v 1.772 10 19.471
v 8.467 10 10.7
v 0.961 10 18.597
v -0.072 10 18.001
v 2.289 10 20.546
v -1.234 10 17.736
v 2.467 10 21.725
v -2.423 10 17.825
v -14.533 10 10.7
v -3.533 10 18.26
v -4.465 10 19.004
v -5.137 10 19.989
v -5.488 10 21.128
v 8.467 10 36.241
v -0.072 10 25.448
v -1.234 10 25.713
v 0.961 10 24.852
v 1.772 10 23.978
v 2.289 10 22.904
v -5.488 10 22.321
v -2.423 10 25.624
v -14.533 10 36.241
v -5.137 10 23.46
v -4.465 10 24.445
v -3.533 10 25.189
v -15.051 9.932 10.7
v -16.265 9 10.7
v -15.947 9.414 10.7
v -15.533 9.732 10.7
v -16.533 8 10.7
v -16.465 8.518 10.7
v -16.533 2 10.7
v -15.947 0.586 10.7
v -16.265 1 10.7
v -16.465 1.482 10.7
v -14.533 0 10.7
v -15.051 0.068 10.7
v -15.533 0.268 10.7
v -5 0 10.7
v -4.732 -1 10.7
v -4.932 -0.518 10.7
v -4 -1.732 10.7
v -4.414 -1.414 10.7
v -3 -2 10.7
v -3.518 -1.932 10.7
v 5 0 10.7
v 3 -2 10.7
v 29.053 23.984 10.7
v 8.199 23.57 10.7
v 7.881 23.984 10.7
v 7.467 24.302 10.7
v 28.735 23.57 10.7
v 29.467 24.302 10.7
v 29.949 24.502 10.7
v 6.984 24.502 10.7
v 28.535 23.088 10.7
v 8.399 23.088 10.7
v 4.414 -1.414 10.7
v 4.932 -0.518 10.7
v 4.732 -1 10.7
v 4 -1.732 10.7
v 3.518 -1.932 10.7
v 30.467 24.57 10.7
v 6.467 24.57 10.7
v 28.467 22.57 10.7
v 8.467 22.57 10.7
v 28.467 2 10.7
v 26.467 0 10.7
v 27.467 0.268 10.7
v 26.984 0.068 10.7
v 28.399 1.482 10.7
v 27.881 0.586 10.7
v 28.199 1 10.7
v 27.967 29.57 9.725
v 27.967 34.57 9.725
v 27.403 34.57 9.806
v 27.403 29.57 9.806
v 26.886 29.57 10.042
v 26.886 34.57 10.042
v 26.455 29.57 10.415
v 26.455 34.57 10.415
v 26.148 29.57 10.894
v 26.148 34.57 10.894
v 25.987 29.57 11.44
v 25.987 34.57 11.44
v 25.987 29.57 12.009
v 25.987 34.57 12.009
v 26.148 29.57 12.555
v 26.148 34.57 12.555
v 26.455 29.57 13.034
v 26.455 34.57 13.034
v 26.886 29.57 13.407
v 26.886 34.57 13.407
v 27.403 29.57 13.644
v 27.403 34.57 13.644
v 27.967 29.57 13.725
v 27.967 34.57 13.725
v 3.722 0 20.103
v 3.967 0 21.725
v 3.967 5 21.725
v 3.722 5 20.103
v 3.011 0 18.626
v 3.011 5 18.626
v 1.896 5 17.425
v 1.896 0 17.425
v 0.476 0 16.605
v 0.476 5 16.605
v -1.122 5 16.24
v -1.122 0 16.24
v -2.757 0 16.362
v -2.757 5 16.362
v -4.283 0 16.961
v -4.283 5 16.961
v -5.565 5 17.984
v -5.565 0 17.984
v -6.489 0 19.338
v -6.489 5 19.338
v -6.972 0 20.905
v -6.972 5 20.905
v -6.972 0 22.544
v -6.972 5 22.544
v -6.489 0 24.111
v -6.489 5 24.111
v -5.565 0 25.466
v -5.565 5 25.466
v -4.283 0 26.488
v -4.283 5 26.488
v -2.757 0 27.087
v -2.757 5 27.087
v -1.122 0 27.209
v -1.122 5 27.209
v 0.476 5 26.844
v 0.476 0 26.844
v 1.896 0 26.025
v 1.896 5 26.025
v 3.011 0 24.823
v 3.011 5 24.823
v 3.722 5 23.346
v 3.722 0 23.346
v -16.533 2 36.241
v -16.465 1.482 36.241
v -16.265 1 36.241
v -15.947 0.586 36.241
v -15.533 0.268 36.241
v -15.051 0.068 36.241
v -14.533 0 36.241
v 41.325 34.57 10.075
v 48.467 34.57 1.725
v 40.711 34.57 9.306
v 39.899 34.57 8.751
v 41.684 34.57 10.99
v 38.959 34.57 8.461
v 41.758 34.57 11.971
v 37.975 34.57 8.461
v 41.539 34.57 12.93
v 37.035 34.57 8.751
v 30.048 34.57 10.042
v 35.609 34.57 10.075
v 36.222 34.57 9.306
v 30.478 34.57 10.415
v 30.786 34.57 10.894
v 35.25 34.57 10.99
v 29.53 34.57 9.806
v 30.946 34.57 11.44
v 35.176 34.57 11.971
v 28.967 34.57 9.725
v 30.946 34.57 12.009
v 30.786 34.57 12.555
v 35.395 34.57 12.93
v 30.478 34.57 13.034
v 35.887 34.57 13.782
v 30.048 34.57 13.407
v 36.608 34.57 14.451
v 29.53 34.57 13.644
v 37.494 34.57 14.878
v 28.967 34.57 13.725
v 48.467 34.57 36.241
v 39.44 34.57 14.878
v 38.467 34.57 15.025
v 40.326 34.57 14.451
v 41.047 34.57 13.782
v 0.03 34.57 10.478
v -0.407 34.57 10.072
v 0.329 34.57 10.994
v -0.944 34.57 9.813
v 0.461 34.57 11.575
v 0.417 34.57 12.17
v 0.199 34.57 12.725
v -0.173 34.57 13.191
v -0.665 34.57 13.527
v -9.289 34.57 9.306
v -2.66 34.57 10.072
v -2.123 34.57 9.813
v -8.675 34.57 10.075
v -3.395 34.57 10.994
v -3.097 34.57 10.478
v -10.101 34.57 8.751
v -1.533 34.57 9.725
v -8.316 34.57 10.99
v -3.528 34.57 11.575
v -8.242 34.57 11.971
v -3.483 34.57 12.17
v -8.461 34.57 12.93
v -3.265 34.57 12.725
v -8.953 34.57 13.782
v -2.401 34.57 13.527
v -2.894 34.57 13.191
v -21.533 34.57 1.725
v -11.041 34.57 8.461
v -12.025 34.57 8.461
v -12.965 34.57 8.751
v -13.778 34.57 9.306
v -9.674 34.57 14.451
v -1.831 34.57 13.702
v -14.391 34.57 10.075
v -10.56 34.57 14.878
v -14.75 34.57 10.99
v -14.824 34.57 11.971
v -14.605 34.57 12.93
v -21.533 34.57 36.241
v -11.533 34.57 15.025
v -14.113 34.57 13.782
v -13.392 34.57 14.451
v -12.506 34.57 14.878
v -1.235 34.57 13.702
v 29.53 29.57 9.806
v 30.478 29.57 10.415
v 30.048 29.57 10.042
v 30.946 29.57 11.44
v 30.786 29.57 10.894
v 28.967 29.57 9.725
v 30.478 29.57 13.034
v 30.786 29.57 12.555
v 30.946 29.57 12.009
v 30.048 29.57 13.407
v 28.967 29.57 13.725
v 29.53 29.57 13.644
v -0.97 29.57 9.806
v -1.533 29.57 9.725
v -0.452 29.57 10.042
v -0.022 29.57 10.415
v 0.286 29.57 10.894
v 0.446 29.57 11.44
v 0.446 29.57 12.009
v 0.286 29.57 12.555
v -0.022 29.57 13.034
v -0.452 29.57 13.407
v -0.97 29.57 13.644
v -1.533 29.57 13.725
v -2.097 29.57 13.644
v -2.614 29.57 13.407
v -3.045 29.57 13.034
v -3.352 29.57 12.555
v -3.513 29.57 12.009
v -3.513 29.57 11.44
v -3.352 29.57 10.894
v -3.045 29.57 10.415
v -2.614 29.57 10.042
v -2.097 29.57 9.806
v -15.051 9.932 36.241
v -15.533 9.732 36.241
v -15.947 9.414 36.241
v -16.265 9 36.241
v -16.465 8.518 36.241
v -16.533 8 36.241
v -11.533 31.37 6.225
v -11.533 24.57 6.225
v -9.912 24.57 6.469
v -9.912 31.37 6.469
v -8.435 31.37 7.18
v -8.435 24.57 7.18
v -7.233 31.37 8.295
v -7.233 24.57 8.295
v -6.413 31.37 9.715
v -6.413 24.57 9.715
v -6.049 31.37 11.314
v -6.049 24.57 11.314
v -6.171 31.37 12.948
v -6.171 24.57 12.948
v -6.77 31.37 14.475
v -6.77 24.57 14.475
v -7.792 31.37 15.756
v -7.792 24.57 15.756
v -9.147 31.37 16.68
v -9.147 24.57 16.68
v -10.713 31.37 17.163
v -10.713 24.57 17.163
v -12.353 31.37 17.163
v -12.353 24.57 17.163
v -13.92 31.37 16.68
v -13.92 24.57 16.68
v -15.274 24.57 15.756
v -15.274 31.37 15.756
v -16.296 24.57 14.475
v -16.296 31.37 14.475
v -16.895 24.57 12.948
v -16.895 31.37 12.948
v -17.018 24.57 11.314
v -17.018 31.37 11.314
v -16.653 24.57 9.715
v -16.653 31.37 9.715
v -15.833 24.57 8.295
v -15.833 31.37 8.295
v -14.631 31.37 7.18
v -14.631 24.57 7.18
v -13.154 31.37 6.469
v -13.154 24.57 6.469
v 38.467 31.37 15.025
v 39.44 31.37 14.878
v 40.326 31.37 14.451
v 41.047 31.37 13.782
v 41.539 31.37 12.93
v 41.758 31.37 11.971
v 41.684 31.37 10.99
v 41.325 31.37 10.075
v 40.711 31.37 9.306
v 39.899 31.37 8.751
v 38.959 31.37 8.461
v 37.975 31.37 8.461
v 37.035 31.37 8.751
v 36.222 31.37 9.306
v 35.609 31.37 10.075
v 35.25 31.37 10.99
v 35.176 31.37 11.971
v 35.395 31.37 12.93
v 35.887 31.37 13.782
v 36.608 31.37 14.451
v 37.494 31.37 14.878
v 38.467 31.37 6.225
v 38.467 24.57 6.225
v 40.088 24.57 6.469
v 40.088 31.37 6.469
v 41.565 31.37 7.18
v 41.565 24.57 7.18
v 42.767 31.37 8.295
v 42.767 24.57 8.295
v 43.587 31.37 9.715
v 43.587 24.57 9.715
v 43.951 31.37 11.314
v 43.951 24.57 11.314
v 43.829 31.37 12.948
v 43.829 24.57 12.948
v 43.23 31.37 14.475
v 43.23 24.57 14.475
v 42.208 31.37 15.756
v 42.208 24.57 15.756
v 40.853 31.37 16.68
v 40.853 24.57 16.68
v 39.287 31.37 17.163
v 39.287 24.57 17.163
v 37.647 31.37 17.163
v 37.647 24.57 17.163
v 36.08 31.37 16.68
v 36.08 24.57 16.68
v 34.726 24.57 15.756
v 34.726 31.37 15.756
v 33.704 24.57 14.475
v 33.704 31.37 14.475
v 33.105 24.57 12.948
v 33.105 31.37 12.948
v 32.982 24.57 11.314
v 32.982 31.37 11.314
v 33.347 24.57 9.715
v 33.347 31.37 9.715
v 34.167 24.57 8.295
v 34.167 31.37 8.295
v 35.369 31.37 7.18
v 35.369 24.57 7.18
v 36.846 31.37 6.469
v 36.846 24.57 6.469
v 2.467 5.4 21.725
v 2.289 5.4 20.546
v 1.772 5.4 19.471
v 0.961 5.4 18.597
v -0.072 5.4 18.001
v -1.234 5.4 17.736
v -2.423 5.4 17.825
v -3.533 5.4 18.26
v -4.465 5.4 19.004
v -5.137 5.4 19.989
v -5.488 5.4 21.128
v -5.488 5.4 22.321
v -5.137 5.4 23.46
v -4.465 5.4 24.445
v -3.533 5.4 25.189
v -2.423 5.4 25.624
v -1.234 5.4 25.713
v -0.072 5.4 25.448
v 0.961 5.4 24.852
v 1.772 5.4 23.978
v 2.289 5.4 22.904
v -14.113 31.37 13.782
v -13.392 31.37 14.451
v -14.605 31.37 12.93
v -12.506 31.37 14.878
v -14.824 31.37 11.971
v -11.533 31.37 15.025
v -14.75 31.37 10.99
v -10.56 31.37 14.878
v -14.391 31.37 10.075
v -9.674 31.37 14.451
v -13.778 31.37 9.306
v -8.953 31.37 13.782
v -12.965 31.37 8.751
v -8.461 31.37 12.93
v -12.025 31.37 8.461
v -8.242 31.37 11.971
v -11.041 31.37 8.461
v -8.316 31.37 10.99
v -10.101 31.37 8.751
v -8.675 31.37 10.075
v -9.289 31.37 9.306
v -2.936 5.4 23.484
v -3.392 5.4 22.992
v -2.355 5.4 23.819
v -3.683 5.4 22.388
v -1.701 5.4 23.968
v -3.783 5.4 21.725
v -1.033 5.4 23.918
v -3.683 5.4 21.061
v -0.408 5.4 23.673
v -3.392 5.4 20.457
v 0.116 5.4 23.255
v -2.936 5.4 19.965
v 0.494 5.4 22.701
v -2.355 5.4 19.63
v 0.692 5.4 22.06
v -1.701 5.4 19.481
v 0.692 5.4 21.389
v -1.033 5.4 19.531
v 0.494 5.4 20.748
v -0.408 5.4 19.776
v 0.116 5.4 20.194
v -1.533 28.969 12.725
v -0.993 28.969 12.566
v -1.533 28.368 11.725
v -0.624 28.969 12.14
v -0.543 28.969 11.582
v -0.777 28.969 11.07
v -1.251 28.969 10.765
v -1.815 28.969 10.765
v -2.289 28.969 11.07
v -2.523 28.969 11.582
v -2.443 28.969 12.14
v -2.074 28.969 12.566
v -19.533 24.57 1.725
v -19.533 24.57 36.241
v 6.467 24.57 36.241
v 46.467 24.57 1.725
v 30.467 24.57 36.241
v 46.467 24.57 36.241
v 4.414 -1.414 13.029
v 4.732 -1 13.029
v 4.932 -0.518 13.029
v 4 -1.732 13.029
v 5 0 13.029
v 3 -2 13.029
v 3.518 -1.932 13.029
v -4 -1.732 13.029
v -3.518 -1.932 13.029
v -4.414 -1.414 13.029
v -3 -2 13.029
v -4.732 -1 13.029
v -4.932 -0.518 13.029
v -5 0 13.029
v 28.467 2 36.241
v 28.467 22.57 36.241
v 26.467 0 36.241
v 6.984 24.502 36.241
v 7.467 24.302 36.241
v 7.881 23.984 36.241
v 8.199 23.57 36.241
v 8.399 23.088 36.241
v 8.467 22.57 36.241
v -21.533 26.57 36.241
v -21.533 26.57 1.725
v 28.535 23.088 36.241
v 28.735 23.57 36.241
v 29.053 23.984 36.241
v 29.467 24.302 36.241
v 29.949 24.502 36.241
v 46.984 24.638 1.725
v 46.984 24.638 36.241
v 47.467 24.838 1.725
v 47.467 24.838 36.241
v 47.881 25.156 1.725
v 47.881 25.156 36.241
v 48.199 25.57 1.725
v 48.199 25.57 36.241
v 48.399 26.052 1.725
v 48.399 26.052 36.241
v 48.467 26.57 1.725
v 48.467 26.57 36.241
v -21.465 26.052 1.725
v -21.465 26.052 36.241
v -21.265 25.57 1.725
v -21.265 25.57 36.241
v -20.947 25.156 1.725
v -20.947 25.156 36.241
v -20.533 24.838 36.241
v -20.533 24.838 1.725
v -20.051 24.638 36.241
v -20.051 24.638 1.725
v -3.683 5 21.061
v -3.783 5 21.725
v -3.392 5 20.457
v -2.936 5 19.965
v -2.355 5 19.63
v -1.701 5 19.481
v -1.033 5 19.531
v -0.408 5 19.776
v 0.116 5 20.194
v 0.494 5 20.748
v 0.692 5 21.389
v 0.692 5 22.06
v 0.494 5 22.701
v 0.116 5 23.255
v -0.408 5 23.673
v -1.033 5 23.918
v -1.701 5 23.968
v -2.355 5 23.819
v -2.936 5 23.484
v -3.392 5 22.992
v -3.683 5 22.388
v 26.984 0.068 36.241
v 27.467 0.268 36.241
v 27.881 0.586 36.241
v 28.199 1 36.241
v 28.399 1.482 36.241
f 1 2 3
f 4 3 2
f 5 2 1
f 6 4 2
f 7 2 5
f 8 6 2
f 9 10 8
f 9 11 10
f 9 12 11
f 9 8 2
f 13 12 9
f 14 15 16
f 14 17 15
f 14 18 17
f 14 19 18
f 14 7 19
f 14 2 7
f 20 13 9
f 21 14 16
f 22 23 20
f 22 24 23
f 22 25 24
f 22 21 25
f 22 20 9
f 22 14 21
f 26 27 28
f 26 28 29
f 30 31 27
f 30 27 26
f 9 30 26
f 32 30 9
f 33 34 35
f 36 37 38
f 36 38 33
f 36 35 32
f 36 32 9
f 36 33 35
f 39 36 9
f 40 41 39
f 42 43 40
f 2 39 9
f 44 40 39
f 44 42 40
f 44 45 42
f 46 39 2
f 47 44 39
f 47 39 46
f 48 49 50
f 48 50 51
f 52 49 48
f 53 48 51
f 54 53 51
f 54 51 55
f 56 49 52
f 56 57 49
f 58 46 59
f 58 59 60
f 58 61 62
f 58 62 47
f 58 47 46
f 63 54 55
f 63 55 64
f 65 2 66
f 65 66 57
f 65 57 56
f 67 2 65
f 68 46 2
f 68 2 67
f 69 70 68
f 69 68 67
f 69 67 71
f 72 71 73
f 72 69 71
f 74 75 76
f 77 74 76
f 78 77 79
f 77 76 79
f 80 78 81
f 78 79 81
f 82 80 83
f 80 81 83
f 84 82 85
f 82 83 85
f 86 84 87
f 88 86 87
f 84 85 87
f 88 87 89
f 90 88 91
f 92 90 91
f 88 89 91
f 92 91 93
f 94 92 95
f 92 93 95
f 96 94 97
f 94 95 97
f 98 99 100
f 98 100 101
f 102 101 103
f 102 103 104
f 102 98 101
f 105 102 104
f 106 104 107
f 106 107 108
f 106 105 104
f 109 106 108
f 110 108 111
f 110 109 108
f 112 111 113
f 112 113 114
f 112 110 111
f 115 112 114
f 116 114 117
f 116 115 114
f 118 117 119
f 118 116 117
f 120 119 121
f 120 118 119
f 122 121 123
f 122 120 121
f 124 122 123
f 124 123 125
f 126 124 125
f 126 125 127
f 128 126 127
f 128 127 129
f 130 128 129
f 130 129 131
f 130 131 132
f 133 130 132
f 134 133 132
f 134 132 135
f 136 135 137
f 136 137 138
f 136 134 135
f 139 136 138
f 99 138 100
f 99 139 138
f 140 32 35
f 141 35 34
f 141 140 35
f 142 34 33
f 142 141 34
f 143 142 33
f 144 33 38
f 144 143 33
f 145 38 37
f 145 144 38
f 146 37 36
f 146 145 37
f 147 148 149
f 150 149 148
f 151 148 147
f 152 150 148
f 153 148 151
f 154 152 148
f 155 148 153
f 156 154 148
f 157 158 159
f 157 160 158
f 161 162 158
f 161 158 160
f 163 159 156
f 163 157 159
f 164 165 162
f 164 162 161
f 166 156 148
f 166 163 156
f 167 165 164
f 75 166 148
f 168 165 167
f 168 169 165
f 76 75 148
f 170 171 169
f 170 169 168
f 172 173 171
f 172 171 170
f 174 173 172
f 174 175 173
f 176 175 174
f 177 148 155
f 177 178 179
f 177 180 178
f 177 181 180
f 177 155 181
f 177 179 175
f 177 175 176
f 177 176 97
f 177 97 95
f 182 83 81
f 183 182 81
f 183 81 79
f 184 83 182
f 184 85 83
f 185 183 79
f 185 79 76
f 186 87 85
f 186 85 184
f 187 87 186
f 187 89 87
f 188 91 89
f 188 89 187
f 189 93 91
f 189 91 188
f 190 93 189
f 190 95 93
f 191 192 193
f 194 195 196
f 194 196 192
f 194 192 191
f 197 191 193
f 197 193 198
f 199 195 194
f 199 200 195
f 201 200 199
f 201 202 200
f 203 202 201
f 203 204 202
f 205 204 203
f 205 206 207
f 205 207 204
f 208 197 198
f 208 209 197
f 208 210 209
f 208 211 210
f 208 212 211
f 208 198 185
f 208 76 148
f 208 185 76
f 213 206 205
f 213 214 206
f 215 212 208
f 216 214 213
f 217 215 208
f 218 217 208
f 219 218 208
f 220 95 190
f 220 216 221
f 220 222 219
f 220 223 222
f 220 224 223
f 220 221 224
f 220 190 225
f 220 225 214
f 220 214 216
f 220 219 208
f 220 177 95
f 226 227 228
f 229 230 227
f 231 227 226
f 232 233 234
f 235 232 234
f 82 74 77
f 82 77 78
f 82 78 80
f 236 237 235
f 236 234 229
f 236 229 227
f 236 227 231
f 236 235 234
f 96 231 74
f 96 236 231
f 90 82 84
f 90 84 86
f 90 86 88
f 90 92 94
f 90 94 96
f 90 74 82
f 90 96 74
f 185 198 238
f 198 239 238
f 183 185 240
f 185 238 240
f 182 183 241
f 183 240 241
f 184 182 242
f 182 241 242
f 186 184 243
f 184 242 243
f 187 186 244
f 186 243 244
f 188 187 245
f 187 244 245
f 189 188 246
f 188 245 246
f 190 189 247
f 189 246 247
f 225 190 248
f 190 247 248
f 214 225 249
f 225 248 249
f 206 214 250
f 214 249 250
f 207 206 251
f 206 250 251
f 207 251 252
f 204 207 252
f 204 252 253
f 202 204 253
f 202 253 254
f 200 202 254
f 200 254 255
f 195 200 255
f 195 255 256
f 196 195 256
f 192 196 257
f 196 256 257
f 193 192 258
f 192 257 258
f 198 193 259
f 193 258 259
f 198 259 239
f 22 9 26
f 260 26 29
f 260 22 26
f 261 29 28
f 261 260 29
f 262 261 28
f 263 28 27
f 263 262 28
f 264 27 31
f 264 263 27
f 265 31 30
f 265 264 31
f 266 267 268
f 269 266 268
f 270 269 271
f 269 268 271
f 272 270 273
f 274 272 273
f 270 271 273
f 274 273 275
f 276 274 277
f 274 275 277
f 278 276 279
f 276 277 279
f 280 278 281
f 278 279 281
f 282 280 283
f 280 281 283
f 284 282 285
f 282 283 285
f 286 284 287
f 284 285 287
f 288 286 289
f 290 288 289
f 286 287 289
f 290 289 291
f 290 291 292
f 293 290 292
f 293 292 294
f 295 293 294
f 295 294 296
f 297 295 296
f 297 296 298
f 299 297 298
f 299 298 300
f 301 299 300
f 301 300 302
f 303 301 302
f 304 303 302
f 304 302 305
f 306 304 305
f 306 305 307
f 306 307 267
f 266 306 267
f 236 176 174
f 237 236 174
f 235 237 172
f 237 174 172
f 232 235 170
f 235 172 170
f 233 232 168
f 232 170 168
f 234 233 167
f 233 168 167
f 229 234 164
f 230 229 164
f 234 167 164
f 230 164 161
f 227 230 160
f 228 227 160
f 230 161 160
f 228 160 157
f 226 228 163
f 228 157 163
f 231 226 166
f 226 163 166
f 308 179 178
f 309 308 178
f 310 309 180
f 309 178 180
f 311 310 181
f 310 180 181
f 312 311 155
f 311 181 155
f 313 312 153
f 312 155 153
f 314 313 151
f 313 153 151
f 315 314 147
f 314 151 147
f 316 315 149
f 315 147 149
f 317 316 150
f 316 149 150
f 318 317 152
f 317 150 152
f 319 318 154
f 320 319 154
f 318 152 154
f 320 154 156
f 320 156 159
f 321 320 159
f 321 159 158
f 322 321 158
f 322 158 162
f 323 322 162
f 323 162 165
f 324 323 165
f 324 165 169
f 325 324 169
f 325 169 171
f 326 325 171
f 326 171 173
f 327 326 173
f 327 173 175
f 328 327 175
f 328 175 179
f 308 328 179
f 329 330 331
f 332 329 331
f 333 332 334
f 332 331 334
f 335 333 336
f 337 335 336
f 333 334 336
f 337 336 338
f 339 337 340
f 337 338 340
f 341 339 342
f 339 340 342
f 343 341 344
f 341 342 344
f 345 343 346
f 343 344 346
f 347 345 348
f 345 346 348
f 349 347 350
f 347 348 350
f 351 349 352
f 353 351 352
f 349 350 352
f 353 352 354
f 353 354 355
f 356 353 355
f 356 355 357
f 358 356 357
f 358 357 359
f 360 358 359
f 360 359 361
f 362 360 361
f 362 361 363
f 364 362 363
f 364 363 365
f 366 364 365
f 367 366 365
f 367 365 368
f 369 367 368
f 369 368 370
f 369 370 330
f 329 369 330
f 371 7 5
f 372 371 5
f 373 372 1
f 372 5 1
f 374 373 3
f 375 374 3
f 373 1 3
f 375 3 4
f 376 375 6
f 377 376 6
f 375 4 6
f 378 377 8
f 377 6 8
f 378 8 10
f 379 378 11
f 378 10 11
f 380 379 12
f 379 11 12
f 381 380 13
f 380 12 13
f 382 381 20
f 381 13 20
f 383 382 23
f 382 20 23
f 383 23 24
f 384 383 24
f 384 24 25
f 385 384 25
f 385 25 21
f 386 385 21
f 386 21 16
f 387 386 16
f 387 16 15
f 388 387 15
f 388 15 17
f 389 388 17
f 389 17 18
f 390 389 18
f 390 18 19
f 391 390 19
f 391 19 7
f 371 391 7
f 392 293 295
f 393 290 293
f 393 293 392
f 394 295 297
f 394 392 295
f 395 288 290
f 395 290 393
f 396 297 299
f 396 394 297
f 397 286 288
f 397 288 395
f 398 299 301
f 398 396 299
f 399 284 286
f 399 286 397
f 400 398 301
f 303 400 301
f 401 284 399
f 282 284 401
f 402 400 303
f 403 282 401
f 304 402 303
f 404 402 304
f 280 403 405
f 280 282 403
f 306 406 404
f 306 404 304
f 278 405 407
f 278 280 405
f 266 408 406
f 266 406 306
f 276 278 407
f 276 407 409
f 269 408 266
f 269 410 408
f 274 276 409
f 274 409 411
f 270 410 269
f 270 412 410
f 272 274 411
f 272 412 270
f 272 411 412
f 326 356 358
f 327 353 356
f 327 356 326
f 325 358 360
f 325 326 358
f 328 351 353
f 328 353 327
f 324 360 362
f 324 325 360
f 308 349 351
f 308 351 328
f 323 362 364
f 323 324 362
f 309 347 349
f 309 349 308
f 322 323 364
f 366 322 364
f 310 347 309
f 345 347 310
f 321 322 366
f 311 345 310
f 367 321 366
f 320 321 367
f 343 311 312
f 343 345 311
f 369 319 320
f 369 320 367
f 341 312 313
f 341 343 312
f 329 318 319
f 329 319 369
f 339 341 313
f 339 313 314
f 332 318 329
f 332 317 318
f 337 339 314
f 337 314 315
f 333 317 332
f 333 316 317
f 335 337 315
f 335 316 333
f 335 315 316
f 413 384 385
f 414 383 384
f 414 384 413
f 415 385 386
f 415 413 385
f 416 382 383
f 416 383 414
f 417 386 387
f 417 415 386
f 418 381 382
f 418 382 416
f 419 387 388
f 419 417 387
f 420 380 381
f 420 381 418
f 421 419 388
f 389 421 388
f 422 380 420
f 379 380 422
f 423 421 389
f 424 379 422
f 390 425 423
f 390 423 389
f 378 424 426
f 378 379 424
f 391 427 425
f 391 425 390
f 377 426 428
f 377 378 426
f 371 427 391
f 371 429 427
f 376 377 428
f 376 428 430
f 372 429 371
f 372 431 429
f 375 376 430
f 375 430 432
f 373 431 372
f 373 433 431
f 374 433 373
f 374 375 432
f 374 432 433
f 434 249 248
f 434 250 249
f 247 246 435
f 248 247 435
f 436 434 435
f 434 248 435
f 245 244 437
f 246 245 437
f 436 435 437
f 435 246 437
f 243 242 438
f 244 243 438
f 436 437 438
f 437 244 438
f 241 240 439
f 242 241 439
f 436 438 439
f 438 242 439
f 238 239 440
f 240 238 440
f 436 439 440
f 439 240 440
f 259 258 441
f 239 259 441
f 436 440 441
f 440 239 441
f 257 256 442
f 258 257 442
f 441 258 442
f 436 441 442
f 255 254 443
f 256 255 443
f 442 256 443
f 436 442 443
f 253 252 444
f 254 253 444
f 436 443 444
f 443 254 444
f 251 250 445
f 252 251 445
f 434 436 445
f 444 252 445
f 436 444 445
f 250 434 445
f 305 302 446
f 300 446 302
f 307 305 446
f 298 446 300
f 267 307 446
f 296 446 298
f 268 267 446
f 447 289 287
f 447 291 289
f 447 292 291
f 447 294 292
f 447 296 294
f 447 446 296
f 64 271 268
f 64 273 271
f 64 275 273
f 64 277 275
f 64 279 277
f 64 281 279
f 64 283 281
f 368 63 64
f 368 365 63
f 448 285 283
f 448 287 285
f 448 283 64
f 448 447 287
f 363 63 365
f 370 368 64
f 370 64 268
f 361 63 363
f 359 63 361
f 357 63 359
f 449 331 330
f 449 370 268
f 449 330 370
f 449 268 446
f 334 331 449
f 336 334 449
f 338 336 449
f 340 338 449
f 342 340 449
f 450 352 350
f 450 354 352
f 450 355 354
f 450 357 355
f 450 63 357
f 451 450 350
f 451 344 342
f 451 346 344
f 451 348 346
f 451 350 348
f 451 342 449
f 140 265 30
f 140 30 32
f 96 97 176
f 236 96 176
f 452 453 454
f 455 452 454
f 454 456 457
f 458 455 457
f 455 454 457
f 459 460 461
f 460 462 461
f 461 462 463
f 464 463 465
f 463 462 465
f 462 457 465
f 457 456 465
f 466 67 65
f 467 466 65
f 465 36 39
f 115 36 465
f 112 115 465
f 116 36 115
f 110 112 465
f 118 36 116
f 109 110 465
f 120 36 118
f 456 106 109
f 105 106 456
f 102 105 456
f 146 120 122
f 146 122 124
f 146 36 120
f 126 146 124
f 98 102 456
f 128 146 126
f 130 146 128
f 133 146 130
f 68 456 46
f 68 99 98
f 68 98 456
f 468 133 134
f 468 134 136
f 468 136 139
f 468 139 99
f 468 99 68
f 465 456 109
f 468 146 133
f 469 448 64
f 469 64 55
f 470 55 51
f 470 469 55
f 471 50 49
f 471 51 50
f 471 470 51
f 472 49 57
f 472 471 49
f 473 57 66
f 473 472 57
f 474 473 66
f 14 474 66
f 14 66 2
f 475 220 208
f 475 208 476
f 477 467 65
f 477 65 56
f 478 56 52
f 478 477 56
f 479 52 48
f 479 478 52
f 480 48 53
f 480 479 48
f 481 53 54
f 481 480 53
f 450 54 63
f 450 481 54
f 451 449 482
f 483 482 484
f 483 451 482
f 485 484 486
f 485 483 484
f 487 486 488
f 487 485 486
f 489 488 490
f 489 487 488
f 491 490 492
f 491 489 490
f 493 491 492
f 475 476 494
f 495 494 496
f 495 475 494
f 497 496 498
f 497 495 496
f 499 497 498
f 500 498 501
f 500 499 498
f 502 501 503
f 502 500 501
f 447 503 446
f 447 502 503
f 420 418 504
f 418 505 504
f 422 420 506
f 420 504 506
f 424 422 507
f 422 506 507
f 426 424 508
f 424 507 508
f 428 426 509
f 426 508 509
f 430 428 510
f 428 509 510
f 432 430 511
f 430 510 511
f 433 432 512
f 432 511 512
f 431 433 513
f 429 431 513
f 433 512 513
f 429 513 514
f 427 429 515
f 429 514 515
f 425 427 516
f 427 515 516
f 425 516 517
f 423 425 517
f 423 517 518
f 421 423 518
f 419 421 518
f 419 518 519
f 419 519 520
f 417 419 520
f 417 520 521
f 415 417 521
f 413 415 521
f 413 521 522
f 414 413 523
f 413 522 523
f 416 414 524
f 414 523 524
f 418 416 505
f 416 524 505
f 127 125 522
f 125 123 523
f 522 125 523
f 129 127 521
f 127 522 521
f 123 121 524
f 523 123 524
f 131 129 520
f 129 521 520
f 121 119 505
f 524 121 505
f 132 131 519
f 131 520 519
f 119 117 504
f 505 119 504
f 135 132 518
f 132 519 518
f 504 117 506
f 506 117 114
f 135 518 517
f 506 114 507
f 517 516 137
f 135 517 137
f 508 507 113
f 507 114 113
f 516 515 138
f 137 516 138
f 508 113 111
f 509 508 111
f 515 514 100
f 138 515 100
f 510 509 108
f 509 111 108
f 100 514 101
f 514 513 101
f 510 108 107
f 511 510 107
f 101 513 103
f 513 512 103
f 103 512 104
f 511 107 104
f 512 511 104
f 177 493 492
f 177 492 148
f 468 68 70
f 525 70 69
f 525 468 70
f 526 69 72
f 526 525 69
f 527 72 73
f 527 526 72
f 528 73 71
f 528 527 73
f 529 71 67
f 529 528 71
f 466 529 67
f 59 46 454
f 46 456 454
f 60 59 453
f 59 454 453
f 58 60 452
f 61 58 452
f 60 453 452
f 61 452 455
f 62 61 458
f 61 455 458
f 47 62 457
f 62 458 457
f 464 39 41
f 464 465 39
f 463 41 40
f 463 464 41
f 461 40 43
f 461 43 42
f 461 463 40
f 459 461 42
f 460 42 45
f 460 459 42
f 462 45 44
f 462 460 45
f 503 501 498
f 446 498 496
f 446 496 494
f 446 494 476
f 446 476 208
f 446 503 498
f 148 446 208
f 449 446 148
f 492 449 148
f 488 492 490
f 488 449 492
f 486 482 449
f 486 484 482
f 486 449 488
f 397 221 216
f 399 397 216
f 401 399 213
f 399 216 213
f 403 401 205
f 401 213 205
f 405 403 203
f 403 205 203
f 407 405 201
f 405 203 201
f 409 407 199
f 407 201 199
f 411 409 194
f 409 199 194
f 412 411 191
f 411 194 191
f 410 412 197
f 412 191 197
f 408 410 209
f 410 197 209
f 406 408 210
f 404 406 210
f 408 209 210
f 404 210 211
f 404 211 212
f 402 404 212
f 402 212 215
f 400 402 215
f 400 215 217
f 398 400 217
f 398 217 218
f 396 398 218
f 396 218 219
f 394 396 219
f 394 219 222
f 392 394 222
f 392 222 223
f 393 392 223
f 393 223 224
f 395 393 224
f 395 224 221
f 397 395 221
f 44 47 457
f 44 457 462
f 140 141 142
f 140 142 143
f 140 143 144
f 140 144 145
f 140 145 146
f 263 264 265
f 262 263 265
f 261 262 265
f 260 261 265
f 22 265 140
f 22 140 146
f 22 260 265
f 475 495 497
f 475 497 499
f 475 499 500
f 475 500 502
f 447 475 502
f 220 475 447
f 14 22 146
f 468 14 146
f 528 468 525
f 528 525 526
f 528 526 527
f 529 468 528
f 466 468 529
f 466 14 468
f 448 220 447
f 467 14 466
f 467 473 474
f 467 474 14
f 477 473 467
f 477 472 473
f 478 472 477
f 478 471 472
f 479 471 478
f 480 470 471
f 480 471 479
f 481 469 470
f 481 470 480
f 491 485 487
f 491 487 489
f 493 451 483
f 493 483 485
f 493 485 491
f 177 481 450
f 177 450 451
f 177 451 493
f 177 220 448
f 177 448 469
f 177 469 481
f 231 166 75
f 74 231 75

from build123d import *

# Parameters (mm, degrees)
SKETCH_8_W                = 70
SKETCH_8_H                = 30
EXTRUDE_3_DEPTH           = 34.57
SKETCH_9_W                = 30
SKETCH_9_H                = 14.57
SKETCH_9_W_2              = 20
CUT_EXTRUDE_3_DEPTH       = 67.664217758
OTHER_1_OUTLINE_R         = 5.5
OTHER_1_DEPTH             = 5
HOLE_WIZARD_2_D           = 4.5
HOLE_WIZARD_2_DEPTH       = 10
HOLE_WIZARD_2_CBORE_D     = 8
HOLE_WIZARD_2_CBORE_DEPTH = 4.6
BACK_REACH                = 69.458
SKETCH_16_W               = 70
SKETCH_16_H               = 8.975361008
MM_1_D                    = 4
MM_1_DEPTH                = 5
MM_1_TIP                  = 1.201721238
CUT_EXTRUDE_5_DEPTH       = 5
SKETCH_24_W               = 5
SKETCH_24_H               = 21.024638992
SKETCH_24_W_2             = 20
CUT_EXTRUDE_6_DEPTH       = 10
HOLE_WIZARD_3_D           = 6.6
HOLE_WIZARD_3_DEPTH       = 10
HOLE_WIZARD_3_CBORE_D     = 11
HOLE_WIZARD_3_CBORE_DEPTH = 6.8
FILLET_1_R                = 2
SKETCH_29_W               = 10
SKETCH_29_H               = 2
EXTRUDE_5_DEPTH           = 2.329281552
FILLET_3_R                = 2
CUT_EXTRUDE_7_DEPTH       = 0.5
EXTRUDE_START             = 5.016506594
EXTRUDE_6_DEPTH           = 5.016506594


# Read off the part's stored shape, not the designer's step: 孔1
with BuildPart() as part:
    # 草图8 → 凸台-拉伸3 (new body)
    with BuildSketch(Plane(origin=(0, 0, 0), x_dir=(1, 0, 0), z_dir=(0, 1, 0))):
        with Locations((13.466824006, -16.724598186)):
            Rectangle(SKETCH_8_W, SKETCH_8_H)
    extrude(amount=EXTRUDE_3_DEPTH)

    # 草图9 → 切除-拉伸3 (cut, through all)
    with BuildSketch(Plane.XY.offset(31.724598186)):
        with Locations((-6.533175994, 17.285)):
            Rectangle(SKETCH_9_W, SKETCH_9_H)
        with Locations((38.466824006, 17.285)):
            Rectangle(SKETCH_9_W_2, SKETCH_9_H)
    extrude(amount=-CUT_EXTRUDE_3_DEPTH, mode=Mode.SUBTRACT)

    # 孔1 outline → 孔1 (cut)
    with BuildSketch(Plane(origin=(0, 0, 0), x_dir=(1, 0, 0), z_dir=(0, 1, 0))):
        with Locations((-1.533175994, -21.724598186)):
            Circle(OTHER_1_OUTLINE_R)
    extrude(amount=OTHER_1_DEPTH, mode=Mode.SUBTRACT)

    # 打孔尺寸(%根据)内六角圆柱头螺钉的类型2
    with Locations(Plane(origin=(-1.533175994, 10, 21.724598186), x_dir=(1, 0, 0), z_dir=(0, 1, 0))):
        with Locations((0, 0)):
            CounterBoreHole(HOLE_WIZARD_2_D / 2, HOLE_WIZARD_2_CBORE_D / 2, HOLE_WIZARD_2_CBORE_DEPTH, depth=HOLE_WIZARD_2_DEPTH)

    # back: up to this face of the body (flat: up to its plane)
    back_end = Plane(part.part.faces().sort_by_distance((-6.533175994, 24.57, 16.724598186))[0])
    # 草图16 → back (cut, up to the picked face)
    with BuildSketch(Plane(origin=(0, 0, 0), x_dir=(1, 0, 0), z_dir=(0, 1, 0)), mode=Mode.PRIVATE) as back_sk1:
        with Locations((13.466824006, -6.21227869)):
            Rectangle(SKETCH_16_W, SKETCH_16_H)
    back_tool1 = split(extrude(back_sk1.sketch, amount=BACK_REACH, mode=Mode.PRIVATE), bisect_by=back_end, keep=Keep.BOTH, mode=Mode.PRIVATE)
    add(back_tool1.solids().sort_by(Axis((13.466824, 0, 6.212279), (0, 1, 0)))[0], mode=Mode.SUBTRACT)

    # 大小mm 暗销孔1
    with Locations(Plane(origin=(-1.533175994, 34.57, 11.724598186), x_dir=(0, 0, 1), z_dir=(0, 1, 0))):
        with Locations((0, 0)):
            Hole(MM_1_D / 2, depth=MM_1_DEPTH)
            with Locations((0, 0, -(MM_1_DEPTH + MM_1_TIP / 2))):  # 118° drill point
                Cone(0, MM_1_D / 2, MM_1_TIP, mode=Mode.SUBTRACT)

    # 草图23 → 切除-拉伸5 (cut)
    with BuildSketch(Plane.XZ.offset(-34.57)):
        with BuildLine():
            Line((28.966824006, 9.724598186), (27.966824006, 9.724598186))
            ThreePointArc((27.966824006, 9.724598186), (25.966824006, 11.724598186), (27.966824006, 13.724598186))
            Line((27.966824006, 13.724598186), (28.966824006, 13.724598186))
            ThreePointArc((28.966824006, 13.724598186), (30.966824006, 11.724598186), (28.966824006, 9.724598186))
        make_face()
    extrude(amount=CUT_EXTRUDE_5_DEPTH, mode=Mode.SUBTRACT)

    # 草图24 → 切除-拉伸6 (cut)
    with BuildSketch(Plane(origin=(0, 0, 0), x_dir=(1, 0, 0), z_dir=(0, 1, 0))):
        with Locations((-19.033175994, -21.21227869)):
            Rectangle(SKETCH_24_W, SKETCH_24_H)
        with Locations((38.466824006, -21.21227869)):
            Rectangle(SKETCH_24_W_2, SKETCH_24_H)
    extrude(amount=CUT_EXTRUDE_6_DEPTH, mode=Mode.SUBTRACT)

    # 打孔尺寸(%根据)内六角圆柱头螺钉的类型3
    with Locations(Plane(origin=(-11.533175994, 24.57, 11.724598186), x_dir=(0, 0, -1), z_dir=(0, -1, 0))):
        with Locations((0, 0), (0, 50)):
            CounterBoreHole(HOLE_WIZARD_3_D / 2, HOLE_WIZARD_3_CBORE_D / 2, HOLE_WIZARD_3_CBORE_DEPTH, depth=HOLE_WIZARD_3_DEPTH)

    # 圆角1
    fillet_1_edges = [part.edges().sort_by_distance(p)[0] for p in [
        (-16.533175994, 0, 21.21227869),
        (-16.533175994, 10, 21.21227869),
        (28.466824006, 0, 21.21227869),
        (-21.533175994, 24.57, 16.724598186),
        (48.466824006, 24.57, 16.724598186),
        (8.466824006, 24.57, 21.21227869),
        (28.466824006, 24.57, 21.21227869),
    ]]
    fillet(fillet_1_edges, radius=FILLET_1_R)

    # 草图29 → 凸台-拉伸5 (add)
    with BuildSketch(Plane(origin=(0, 0, 10.699959194), x_dir=(-1, 0, 0), z_dir=(0, 0, -1))):
        with Locations((0, -1)):
            Rectangle(SKETCH_29_W, SKETCH_29_H)
    extrude(amount=-EXTRUDE_5_DEPTH)

    # 圆角3
    fillet_3_edges = [part.edges().sort_by_distance(p)[0] for p in [
        (-5, -2, 11.86459997),
        (5, -2, 11.86459997),
    ]]
    fillet(fillet_3_edges, radius=FILLET_3_R - 0.0001)  # a hair under: the kernel refuses the full size

    # 草图30 → 切除-拉伸7 (cut)
    with BuildSketch(Plane.XY.offset(31.724598186)):
        with BuildLine():
            Line((-14.533175994, 0), (26.466824006, 0))
            ThreePointArc((26.466824006, 0), (27.881037569, 0.585786438), (28.466824006, 2))
            Line((28.466824006, 2), (28.466824006, 22.57))
            ThreePointArc((28.466824006, 22.57), (29.052610444, 23.984213562), (30.466824006, 24.57))
            Line((30.466824006, 24.57), (46.466824006, 24.57))
            ThreePointArc((46.466824006, 24.57), (47.881037569, 25.155786438), (48.466824006, 26.57))
            Line((48.466824006, 26.57), (48.466824006, 34.57))
            Line((48.466824006, 34.57), (-21.533175994, 34.57))
            Line((-21.533175994, 34.57), (-21.533175994, 26.57))
            ThreePointArc((-21.533175994, 26.57), (-20.947389556, 25.155786438), (-19.533175994, 24.57))
            Line((-19.533175994, 24.57), (6.466824006, 24.57))
            ThreePointArc((6.466824006, 24.57), (7.881037569, 23.984213562), (8.466824006, 22.57))
            Line((8.466824006, 22.57), (8.466824006, 10))
            Line((8.466824006, 10), (-14.533175994, 10))
            ThreePointArc((-14.533175994, 10), (-15.947389556, 9.414213562), (-16.533175994, 8))
            Line((-16.533175994, 8), (-16.533175994, 2))
            ThreePointArc((-16.533175994, 2), (-15.947389556, 0.585786438), (-14.533175994, 0))
        make_face()
    extrude(amount=-CUT_EXTRUDE_7_DEPTH, mode=Mode.SUBTRACT)

    # 草图31 → 凸台-拉伸6 (add)
    with BuildSketch(Plane.XY.offset(31.224598186).offset(EXTRUDE_START)):
        with BuildLine():
            Line((-14.533175994, 0), (26.466824006, 0))
            ThreePointArc((26.466824006, 0), (27.881037569, 0.585786438), (28.466824006, 2))
            Line((28.466824006, 2), (28.466824006, 22.57))
            ThreePointArc((28.466824006, 22.57), (29.052610444, 23.984213562), (30.466824006, 24.57))
            Line((30.466824006, 24.57), (46.466824006, 24.57))
            ThreePointArc((46.466824006, 24.57), (47.881037569, 25.155786438), (48.466824006, 26.57))
            Line((48.466824006, 26.57), (48.466824006, 34.57))
            Line((48.466824006, 34.57), (-21.533175994, 34.57))
            Line((-21.533175994, 34.57), (-21.533175994, 26.57))
            ThreePointArc((-21.533175994, 26.57), (-20.947389556, 25.155786438), (-19.533175994, 24.57))
            Line((-19.533175994, 24.57), (6.466824006, 24.57))
            ThreePointArc((6.466824006, 24.57), (7.881037569, 23.984213562), (8.466824006, 22.57))
            Line((8.466824006, 22.57), (8.466824006, 10))
            Line((8.466824006, 10), (-14.533175994, 10))
            ThreePointArc((-14.533175994, 10), (-15.947389556, 9.414213562), (-16.533175994, 8))
            Line((-16.533175994, 8), (-16.533175994, 2))
            ThreePointArc((-16.533175994, 2), (-15.947389556, 0.585786438), (-14.533175994, 0))
        make_face()
    extrude(amount=-EXTRUDE_6_DEPTH)


solid = part.part
